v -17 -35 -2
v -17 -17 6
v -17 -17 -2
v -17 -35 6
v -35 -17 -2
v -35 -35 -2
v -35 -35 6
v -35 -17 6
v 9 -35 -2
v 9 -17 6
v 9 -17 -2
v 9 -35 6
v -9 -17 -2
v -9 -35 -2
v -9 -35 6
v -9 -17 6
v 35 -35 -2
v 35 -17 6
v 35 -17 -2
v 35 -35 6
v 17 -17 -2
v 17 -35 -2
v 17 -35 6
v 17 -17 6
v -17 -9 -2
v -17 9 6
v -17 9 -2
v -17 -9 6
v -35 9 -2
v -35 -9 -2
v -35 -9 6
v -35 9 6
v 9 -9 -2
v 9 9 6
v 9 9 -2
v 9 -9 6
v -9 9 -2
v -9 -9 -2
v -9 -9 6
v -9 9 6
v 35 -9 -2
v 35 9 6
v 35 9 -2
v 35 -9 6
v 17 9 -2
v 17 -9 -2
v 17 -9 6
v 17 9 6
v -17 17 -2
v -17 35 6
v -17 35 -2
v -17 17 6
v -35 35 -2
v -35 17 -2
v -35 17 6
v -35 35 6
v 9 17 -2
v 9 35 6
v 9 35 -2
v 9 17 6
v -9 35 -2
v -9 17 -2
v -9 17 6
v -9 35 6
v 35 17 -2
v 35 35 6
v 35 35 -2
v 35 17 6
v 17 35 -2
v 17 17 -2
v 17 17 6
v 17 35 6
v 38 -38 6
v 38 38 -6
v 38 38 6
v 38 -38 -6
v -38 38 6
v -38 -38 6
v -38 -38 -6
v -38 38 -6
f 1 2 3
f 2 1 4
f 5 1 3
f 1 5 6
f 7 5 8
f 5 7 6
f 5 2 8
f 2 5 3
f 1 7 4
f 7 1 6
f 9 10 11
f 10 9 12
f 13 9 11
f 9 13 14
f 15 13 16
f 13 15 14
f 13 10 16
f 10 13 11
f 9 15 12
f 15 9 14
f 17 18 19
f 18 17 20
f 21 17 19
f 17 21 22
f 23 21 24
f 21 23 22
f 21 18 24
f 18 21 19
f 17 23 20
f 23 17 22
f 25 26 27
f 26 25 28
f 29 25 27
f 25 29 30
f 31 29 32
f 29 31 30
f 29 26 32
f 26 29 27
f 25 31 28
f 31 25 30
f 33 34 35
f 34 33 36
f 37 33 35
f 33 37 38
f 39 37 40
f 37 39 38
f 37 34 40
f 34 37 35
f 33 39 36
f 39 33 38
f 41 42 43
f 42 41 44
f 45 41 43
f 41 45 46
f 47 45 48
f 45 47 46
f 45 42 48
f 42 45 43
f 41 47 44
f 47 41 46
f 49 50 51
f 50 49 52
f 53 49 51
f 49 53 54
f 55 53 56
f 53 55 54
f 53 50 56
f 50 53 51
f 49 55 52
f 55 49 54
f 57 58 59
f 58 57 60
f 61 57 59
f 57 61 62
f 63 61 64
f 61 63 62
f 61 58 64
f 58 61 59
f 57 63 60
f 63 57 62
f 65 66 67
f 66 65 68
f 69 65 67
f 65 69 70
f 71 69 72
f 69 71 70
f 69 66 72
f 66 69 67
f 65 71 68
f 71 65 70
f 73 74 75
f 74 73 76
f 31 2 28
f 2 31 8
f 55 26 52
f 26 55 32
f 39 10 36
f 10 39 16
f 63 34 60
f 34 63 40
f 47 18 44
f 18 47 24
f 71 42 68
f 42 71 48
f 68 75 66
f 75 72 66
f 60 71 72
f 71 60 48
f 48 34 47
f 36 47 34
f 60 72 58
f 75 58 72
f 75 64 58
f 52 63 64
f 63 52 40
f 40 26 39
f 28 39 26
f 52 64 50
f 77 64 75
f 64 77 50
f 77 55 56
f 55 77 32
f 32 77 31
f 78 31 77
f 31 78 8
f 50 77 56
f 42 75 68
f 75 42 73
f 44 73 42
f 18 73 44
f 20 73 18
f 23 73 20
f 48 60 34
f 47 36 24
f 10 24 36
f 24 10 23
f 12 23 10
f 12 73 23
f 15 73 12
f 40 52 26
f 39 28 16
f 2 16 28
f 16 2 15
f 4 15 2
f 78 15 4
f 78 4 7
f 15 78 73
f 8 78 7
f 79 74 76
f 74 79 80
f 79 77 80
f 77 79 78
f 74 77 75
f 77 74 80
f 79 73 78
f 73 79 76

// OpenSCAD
$fn = 32;

// ----------------------------------------------------------------------
// Pocket plate 76 x 76 x 12
// 3 x 3 pockets 18 mm square, 8 mm deep
// ----------------------------------------------------------------------

// --- parameters (mm) ---
thickness = 12;  // plate thickness
floor_t = 4;     // material left under each pocket
pocket = 18;     // pocket side length
pitch_x = 26;    // pocket pitch along X
pitch_y = 26;    // pocket pitch along Y
cols = 3;        // pockets per row
rows = 3;        // rows of pockets

// --- derived feature positions (mm) ---
depth = thickness - floor_t;        // = 8   pocket depth, down to the floor
span_x = (cols - 1) * pitch_x;      // = 52   distance between outer pockets
span_y = (rows - 1) * pitch_y;      // = 52   distance between outer pocket rows
origin_x = -span_x / 2;             // = -26   X of the first pocket
origin_y = -span_y / 2;             // = -26   Y of the first pocket
plate = [span_x + pocket + 6, span_y + pocket + 6, thickness];  // = [76, 76, 12]   overall size: pockets plus 3 mm of wall on each side
feature_centers = [
  [origin_x + 0 * pitch_x, origin_y + 0 * pitch_y],
  [origin_x + 1 * pitch_x, origin_y + 0 * pitch_y],
  [origin_x + 2 * pitch_x, origin_y + 0 * pitch_y],
  [origin_x + 0 * pitch_x, origin_y + 1 * pitch_y],
  [origin_x + 1 * pitch_x, origin_y + 1 * pitch_y],
  [origin_x + 2 * pitch_x, origin_y + 1 * pitch_y],
  [origin_x + 0 * pitch_x, origin_y + 2 * pitch_y],
  [origin_x + 1 * pitch_x, origin_y + 2 * pitch_y],
  [origin_x + 2 * pitch_x, origin_y + 2 * pitch_y]
];   // pocket centres, used verbatim by the cutter loop

// plate outline, then one pocket per centre in feature_centers
difference() {
  cube(plate, center = true);
  for (centre = feature_centers)
    translate([centre[0] - pocket / 2, centre[1] - pocket / 2, plate[2] / 2 - depth])
      cube([pocket, pocket, depth + 1]);  // centred on the declared pocket centre
}
